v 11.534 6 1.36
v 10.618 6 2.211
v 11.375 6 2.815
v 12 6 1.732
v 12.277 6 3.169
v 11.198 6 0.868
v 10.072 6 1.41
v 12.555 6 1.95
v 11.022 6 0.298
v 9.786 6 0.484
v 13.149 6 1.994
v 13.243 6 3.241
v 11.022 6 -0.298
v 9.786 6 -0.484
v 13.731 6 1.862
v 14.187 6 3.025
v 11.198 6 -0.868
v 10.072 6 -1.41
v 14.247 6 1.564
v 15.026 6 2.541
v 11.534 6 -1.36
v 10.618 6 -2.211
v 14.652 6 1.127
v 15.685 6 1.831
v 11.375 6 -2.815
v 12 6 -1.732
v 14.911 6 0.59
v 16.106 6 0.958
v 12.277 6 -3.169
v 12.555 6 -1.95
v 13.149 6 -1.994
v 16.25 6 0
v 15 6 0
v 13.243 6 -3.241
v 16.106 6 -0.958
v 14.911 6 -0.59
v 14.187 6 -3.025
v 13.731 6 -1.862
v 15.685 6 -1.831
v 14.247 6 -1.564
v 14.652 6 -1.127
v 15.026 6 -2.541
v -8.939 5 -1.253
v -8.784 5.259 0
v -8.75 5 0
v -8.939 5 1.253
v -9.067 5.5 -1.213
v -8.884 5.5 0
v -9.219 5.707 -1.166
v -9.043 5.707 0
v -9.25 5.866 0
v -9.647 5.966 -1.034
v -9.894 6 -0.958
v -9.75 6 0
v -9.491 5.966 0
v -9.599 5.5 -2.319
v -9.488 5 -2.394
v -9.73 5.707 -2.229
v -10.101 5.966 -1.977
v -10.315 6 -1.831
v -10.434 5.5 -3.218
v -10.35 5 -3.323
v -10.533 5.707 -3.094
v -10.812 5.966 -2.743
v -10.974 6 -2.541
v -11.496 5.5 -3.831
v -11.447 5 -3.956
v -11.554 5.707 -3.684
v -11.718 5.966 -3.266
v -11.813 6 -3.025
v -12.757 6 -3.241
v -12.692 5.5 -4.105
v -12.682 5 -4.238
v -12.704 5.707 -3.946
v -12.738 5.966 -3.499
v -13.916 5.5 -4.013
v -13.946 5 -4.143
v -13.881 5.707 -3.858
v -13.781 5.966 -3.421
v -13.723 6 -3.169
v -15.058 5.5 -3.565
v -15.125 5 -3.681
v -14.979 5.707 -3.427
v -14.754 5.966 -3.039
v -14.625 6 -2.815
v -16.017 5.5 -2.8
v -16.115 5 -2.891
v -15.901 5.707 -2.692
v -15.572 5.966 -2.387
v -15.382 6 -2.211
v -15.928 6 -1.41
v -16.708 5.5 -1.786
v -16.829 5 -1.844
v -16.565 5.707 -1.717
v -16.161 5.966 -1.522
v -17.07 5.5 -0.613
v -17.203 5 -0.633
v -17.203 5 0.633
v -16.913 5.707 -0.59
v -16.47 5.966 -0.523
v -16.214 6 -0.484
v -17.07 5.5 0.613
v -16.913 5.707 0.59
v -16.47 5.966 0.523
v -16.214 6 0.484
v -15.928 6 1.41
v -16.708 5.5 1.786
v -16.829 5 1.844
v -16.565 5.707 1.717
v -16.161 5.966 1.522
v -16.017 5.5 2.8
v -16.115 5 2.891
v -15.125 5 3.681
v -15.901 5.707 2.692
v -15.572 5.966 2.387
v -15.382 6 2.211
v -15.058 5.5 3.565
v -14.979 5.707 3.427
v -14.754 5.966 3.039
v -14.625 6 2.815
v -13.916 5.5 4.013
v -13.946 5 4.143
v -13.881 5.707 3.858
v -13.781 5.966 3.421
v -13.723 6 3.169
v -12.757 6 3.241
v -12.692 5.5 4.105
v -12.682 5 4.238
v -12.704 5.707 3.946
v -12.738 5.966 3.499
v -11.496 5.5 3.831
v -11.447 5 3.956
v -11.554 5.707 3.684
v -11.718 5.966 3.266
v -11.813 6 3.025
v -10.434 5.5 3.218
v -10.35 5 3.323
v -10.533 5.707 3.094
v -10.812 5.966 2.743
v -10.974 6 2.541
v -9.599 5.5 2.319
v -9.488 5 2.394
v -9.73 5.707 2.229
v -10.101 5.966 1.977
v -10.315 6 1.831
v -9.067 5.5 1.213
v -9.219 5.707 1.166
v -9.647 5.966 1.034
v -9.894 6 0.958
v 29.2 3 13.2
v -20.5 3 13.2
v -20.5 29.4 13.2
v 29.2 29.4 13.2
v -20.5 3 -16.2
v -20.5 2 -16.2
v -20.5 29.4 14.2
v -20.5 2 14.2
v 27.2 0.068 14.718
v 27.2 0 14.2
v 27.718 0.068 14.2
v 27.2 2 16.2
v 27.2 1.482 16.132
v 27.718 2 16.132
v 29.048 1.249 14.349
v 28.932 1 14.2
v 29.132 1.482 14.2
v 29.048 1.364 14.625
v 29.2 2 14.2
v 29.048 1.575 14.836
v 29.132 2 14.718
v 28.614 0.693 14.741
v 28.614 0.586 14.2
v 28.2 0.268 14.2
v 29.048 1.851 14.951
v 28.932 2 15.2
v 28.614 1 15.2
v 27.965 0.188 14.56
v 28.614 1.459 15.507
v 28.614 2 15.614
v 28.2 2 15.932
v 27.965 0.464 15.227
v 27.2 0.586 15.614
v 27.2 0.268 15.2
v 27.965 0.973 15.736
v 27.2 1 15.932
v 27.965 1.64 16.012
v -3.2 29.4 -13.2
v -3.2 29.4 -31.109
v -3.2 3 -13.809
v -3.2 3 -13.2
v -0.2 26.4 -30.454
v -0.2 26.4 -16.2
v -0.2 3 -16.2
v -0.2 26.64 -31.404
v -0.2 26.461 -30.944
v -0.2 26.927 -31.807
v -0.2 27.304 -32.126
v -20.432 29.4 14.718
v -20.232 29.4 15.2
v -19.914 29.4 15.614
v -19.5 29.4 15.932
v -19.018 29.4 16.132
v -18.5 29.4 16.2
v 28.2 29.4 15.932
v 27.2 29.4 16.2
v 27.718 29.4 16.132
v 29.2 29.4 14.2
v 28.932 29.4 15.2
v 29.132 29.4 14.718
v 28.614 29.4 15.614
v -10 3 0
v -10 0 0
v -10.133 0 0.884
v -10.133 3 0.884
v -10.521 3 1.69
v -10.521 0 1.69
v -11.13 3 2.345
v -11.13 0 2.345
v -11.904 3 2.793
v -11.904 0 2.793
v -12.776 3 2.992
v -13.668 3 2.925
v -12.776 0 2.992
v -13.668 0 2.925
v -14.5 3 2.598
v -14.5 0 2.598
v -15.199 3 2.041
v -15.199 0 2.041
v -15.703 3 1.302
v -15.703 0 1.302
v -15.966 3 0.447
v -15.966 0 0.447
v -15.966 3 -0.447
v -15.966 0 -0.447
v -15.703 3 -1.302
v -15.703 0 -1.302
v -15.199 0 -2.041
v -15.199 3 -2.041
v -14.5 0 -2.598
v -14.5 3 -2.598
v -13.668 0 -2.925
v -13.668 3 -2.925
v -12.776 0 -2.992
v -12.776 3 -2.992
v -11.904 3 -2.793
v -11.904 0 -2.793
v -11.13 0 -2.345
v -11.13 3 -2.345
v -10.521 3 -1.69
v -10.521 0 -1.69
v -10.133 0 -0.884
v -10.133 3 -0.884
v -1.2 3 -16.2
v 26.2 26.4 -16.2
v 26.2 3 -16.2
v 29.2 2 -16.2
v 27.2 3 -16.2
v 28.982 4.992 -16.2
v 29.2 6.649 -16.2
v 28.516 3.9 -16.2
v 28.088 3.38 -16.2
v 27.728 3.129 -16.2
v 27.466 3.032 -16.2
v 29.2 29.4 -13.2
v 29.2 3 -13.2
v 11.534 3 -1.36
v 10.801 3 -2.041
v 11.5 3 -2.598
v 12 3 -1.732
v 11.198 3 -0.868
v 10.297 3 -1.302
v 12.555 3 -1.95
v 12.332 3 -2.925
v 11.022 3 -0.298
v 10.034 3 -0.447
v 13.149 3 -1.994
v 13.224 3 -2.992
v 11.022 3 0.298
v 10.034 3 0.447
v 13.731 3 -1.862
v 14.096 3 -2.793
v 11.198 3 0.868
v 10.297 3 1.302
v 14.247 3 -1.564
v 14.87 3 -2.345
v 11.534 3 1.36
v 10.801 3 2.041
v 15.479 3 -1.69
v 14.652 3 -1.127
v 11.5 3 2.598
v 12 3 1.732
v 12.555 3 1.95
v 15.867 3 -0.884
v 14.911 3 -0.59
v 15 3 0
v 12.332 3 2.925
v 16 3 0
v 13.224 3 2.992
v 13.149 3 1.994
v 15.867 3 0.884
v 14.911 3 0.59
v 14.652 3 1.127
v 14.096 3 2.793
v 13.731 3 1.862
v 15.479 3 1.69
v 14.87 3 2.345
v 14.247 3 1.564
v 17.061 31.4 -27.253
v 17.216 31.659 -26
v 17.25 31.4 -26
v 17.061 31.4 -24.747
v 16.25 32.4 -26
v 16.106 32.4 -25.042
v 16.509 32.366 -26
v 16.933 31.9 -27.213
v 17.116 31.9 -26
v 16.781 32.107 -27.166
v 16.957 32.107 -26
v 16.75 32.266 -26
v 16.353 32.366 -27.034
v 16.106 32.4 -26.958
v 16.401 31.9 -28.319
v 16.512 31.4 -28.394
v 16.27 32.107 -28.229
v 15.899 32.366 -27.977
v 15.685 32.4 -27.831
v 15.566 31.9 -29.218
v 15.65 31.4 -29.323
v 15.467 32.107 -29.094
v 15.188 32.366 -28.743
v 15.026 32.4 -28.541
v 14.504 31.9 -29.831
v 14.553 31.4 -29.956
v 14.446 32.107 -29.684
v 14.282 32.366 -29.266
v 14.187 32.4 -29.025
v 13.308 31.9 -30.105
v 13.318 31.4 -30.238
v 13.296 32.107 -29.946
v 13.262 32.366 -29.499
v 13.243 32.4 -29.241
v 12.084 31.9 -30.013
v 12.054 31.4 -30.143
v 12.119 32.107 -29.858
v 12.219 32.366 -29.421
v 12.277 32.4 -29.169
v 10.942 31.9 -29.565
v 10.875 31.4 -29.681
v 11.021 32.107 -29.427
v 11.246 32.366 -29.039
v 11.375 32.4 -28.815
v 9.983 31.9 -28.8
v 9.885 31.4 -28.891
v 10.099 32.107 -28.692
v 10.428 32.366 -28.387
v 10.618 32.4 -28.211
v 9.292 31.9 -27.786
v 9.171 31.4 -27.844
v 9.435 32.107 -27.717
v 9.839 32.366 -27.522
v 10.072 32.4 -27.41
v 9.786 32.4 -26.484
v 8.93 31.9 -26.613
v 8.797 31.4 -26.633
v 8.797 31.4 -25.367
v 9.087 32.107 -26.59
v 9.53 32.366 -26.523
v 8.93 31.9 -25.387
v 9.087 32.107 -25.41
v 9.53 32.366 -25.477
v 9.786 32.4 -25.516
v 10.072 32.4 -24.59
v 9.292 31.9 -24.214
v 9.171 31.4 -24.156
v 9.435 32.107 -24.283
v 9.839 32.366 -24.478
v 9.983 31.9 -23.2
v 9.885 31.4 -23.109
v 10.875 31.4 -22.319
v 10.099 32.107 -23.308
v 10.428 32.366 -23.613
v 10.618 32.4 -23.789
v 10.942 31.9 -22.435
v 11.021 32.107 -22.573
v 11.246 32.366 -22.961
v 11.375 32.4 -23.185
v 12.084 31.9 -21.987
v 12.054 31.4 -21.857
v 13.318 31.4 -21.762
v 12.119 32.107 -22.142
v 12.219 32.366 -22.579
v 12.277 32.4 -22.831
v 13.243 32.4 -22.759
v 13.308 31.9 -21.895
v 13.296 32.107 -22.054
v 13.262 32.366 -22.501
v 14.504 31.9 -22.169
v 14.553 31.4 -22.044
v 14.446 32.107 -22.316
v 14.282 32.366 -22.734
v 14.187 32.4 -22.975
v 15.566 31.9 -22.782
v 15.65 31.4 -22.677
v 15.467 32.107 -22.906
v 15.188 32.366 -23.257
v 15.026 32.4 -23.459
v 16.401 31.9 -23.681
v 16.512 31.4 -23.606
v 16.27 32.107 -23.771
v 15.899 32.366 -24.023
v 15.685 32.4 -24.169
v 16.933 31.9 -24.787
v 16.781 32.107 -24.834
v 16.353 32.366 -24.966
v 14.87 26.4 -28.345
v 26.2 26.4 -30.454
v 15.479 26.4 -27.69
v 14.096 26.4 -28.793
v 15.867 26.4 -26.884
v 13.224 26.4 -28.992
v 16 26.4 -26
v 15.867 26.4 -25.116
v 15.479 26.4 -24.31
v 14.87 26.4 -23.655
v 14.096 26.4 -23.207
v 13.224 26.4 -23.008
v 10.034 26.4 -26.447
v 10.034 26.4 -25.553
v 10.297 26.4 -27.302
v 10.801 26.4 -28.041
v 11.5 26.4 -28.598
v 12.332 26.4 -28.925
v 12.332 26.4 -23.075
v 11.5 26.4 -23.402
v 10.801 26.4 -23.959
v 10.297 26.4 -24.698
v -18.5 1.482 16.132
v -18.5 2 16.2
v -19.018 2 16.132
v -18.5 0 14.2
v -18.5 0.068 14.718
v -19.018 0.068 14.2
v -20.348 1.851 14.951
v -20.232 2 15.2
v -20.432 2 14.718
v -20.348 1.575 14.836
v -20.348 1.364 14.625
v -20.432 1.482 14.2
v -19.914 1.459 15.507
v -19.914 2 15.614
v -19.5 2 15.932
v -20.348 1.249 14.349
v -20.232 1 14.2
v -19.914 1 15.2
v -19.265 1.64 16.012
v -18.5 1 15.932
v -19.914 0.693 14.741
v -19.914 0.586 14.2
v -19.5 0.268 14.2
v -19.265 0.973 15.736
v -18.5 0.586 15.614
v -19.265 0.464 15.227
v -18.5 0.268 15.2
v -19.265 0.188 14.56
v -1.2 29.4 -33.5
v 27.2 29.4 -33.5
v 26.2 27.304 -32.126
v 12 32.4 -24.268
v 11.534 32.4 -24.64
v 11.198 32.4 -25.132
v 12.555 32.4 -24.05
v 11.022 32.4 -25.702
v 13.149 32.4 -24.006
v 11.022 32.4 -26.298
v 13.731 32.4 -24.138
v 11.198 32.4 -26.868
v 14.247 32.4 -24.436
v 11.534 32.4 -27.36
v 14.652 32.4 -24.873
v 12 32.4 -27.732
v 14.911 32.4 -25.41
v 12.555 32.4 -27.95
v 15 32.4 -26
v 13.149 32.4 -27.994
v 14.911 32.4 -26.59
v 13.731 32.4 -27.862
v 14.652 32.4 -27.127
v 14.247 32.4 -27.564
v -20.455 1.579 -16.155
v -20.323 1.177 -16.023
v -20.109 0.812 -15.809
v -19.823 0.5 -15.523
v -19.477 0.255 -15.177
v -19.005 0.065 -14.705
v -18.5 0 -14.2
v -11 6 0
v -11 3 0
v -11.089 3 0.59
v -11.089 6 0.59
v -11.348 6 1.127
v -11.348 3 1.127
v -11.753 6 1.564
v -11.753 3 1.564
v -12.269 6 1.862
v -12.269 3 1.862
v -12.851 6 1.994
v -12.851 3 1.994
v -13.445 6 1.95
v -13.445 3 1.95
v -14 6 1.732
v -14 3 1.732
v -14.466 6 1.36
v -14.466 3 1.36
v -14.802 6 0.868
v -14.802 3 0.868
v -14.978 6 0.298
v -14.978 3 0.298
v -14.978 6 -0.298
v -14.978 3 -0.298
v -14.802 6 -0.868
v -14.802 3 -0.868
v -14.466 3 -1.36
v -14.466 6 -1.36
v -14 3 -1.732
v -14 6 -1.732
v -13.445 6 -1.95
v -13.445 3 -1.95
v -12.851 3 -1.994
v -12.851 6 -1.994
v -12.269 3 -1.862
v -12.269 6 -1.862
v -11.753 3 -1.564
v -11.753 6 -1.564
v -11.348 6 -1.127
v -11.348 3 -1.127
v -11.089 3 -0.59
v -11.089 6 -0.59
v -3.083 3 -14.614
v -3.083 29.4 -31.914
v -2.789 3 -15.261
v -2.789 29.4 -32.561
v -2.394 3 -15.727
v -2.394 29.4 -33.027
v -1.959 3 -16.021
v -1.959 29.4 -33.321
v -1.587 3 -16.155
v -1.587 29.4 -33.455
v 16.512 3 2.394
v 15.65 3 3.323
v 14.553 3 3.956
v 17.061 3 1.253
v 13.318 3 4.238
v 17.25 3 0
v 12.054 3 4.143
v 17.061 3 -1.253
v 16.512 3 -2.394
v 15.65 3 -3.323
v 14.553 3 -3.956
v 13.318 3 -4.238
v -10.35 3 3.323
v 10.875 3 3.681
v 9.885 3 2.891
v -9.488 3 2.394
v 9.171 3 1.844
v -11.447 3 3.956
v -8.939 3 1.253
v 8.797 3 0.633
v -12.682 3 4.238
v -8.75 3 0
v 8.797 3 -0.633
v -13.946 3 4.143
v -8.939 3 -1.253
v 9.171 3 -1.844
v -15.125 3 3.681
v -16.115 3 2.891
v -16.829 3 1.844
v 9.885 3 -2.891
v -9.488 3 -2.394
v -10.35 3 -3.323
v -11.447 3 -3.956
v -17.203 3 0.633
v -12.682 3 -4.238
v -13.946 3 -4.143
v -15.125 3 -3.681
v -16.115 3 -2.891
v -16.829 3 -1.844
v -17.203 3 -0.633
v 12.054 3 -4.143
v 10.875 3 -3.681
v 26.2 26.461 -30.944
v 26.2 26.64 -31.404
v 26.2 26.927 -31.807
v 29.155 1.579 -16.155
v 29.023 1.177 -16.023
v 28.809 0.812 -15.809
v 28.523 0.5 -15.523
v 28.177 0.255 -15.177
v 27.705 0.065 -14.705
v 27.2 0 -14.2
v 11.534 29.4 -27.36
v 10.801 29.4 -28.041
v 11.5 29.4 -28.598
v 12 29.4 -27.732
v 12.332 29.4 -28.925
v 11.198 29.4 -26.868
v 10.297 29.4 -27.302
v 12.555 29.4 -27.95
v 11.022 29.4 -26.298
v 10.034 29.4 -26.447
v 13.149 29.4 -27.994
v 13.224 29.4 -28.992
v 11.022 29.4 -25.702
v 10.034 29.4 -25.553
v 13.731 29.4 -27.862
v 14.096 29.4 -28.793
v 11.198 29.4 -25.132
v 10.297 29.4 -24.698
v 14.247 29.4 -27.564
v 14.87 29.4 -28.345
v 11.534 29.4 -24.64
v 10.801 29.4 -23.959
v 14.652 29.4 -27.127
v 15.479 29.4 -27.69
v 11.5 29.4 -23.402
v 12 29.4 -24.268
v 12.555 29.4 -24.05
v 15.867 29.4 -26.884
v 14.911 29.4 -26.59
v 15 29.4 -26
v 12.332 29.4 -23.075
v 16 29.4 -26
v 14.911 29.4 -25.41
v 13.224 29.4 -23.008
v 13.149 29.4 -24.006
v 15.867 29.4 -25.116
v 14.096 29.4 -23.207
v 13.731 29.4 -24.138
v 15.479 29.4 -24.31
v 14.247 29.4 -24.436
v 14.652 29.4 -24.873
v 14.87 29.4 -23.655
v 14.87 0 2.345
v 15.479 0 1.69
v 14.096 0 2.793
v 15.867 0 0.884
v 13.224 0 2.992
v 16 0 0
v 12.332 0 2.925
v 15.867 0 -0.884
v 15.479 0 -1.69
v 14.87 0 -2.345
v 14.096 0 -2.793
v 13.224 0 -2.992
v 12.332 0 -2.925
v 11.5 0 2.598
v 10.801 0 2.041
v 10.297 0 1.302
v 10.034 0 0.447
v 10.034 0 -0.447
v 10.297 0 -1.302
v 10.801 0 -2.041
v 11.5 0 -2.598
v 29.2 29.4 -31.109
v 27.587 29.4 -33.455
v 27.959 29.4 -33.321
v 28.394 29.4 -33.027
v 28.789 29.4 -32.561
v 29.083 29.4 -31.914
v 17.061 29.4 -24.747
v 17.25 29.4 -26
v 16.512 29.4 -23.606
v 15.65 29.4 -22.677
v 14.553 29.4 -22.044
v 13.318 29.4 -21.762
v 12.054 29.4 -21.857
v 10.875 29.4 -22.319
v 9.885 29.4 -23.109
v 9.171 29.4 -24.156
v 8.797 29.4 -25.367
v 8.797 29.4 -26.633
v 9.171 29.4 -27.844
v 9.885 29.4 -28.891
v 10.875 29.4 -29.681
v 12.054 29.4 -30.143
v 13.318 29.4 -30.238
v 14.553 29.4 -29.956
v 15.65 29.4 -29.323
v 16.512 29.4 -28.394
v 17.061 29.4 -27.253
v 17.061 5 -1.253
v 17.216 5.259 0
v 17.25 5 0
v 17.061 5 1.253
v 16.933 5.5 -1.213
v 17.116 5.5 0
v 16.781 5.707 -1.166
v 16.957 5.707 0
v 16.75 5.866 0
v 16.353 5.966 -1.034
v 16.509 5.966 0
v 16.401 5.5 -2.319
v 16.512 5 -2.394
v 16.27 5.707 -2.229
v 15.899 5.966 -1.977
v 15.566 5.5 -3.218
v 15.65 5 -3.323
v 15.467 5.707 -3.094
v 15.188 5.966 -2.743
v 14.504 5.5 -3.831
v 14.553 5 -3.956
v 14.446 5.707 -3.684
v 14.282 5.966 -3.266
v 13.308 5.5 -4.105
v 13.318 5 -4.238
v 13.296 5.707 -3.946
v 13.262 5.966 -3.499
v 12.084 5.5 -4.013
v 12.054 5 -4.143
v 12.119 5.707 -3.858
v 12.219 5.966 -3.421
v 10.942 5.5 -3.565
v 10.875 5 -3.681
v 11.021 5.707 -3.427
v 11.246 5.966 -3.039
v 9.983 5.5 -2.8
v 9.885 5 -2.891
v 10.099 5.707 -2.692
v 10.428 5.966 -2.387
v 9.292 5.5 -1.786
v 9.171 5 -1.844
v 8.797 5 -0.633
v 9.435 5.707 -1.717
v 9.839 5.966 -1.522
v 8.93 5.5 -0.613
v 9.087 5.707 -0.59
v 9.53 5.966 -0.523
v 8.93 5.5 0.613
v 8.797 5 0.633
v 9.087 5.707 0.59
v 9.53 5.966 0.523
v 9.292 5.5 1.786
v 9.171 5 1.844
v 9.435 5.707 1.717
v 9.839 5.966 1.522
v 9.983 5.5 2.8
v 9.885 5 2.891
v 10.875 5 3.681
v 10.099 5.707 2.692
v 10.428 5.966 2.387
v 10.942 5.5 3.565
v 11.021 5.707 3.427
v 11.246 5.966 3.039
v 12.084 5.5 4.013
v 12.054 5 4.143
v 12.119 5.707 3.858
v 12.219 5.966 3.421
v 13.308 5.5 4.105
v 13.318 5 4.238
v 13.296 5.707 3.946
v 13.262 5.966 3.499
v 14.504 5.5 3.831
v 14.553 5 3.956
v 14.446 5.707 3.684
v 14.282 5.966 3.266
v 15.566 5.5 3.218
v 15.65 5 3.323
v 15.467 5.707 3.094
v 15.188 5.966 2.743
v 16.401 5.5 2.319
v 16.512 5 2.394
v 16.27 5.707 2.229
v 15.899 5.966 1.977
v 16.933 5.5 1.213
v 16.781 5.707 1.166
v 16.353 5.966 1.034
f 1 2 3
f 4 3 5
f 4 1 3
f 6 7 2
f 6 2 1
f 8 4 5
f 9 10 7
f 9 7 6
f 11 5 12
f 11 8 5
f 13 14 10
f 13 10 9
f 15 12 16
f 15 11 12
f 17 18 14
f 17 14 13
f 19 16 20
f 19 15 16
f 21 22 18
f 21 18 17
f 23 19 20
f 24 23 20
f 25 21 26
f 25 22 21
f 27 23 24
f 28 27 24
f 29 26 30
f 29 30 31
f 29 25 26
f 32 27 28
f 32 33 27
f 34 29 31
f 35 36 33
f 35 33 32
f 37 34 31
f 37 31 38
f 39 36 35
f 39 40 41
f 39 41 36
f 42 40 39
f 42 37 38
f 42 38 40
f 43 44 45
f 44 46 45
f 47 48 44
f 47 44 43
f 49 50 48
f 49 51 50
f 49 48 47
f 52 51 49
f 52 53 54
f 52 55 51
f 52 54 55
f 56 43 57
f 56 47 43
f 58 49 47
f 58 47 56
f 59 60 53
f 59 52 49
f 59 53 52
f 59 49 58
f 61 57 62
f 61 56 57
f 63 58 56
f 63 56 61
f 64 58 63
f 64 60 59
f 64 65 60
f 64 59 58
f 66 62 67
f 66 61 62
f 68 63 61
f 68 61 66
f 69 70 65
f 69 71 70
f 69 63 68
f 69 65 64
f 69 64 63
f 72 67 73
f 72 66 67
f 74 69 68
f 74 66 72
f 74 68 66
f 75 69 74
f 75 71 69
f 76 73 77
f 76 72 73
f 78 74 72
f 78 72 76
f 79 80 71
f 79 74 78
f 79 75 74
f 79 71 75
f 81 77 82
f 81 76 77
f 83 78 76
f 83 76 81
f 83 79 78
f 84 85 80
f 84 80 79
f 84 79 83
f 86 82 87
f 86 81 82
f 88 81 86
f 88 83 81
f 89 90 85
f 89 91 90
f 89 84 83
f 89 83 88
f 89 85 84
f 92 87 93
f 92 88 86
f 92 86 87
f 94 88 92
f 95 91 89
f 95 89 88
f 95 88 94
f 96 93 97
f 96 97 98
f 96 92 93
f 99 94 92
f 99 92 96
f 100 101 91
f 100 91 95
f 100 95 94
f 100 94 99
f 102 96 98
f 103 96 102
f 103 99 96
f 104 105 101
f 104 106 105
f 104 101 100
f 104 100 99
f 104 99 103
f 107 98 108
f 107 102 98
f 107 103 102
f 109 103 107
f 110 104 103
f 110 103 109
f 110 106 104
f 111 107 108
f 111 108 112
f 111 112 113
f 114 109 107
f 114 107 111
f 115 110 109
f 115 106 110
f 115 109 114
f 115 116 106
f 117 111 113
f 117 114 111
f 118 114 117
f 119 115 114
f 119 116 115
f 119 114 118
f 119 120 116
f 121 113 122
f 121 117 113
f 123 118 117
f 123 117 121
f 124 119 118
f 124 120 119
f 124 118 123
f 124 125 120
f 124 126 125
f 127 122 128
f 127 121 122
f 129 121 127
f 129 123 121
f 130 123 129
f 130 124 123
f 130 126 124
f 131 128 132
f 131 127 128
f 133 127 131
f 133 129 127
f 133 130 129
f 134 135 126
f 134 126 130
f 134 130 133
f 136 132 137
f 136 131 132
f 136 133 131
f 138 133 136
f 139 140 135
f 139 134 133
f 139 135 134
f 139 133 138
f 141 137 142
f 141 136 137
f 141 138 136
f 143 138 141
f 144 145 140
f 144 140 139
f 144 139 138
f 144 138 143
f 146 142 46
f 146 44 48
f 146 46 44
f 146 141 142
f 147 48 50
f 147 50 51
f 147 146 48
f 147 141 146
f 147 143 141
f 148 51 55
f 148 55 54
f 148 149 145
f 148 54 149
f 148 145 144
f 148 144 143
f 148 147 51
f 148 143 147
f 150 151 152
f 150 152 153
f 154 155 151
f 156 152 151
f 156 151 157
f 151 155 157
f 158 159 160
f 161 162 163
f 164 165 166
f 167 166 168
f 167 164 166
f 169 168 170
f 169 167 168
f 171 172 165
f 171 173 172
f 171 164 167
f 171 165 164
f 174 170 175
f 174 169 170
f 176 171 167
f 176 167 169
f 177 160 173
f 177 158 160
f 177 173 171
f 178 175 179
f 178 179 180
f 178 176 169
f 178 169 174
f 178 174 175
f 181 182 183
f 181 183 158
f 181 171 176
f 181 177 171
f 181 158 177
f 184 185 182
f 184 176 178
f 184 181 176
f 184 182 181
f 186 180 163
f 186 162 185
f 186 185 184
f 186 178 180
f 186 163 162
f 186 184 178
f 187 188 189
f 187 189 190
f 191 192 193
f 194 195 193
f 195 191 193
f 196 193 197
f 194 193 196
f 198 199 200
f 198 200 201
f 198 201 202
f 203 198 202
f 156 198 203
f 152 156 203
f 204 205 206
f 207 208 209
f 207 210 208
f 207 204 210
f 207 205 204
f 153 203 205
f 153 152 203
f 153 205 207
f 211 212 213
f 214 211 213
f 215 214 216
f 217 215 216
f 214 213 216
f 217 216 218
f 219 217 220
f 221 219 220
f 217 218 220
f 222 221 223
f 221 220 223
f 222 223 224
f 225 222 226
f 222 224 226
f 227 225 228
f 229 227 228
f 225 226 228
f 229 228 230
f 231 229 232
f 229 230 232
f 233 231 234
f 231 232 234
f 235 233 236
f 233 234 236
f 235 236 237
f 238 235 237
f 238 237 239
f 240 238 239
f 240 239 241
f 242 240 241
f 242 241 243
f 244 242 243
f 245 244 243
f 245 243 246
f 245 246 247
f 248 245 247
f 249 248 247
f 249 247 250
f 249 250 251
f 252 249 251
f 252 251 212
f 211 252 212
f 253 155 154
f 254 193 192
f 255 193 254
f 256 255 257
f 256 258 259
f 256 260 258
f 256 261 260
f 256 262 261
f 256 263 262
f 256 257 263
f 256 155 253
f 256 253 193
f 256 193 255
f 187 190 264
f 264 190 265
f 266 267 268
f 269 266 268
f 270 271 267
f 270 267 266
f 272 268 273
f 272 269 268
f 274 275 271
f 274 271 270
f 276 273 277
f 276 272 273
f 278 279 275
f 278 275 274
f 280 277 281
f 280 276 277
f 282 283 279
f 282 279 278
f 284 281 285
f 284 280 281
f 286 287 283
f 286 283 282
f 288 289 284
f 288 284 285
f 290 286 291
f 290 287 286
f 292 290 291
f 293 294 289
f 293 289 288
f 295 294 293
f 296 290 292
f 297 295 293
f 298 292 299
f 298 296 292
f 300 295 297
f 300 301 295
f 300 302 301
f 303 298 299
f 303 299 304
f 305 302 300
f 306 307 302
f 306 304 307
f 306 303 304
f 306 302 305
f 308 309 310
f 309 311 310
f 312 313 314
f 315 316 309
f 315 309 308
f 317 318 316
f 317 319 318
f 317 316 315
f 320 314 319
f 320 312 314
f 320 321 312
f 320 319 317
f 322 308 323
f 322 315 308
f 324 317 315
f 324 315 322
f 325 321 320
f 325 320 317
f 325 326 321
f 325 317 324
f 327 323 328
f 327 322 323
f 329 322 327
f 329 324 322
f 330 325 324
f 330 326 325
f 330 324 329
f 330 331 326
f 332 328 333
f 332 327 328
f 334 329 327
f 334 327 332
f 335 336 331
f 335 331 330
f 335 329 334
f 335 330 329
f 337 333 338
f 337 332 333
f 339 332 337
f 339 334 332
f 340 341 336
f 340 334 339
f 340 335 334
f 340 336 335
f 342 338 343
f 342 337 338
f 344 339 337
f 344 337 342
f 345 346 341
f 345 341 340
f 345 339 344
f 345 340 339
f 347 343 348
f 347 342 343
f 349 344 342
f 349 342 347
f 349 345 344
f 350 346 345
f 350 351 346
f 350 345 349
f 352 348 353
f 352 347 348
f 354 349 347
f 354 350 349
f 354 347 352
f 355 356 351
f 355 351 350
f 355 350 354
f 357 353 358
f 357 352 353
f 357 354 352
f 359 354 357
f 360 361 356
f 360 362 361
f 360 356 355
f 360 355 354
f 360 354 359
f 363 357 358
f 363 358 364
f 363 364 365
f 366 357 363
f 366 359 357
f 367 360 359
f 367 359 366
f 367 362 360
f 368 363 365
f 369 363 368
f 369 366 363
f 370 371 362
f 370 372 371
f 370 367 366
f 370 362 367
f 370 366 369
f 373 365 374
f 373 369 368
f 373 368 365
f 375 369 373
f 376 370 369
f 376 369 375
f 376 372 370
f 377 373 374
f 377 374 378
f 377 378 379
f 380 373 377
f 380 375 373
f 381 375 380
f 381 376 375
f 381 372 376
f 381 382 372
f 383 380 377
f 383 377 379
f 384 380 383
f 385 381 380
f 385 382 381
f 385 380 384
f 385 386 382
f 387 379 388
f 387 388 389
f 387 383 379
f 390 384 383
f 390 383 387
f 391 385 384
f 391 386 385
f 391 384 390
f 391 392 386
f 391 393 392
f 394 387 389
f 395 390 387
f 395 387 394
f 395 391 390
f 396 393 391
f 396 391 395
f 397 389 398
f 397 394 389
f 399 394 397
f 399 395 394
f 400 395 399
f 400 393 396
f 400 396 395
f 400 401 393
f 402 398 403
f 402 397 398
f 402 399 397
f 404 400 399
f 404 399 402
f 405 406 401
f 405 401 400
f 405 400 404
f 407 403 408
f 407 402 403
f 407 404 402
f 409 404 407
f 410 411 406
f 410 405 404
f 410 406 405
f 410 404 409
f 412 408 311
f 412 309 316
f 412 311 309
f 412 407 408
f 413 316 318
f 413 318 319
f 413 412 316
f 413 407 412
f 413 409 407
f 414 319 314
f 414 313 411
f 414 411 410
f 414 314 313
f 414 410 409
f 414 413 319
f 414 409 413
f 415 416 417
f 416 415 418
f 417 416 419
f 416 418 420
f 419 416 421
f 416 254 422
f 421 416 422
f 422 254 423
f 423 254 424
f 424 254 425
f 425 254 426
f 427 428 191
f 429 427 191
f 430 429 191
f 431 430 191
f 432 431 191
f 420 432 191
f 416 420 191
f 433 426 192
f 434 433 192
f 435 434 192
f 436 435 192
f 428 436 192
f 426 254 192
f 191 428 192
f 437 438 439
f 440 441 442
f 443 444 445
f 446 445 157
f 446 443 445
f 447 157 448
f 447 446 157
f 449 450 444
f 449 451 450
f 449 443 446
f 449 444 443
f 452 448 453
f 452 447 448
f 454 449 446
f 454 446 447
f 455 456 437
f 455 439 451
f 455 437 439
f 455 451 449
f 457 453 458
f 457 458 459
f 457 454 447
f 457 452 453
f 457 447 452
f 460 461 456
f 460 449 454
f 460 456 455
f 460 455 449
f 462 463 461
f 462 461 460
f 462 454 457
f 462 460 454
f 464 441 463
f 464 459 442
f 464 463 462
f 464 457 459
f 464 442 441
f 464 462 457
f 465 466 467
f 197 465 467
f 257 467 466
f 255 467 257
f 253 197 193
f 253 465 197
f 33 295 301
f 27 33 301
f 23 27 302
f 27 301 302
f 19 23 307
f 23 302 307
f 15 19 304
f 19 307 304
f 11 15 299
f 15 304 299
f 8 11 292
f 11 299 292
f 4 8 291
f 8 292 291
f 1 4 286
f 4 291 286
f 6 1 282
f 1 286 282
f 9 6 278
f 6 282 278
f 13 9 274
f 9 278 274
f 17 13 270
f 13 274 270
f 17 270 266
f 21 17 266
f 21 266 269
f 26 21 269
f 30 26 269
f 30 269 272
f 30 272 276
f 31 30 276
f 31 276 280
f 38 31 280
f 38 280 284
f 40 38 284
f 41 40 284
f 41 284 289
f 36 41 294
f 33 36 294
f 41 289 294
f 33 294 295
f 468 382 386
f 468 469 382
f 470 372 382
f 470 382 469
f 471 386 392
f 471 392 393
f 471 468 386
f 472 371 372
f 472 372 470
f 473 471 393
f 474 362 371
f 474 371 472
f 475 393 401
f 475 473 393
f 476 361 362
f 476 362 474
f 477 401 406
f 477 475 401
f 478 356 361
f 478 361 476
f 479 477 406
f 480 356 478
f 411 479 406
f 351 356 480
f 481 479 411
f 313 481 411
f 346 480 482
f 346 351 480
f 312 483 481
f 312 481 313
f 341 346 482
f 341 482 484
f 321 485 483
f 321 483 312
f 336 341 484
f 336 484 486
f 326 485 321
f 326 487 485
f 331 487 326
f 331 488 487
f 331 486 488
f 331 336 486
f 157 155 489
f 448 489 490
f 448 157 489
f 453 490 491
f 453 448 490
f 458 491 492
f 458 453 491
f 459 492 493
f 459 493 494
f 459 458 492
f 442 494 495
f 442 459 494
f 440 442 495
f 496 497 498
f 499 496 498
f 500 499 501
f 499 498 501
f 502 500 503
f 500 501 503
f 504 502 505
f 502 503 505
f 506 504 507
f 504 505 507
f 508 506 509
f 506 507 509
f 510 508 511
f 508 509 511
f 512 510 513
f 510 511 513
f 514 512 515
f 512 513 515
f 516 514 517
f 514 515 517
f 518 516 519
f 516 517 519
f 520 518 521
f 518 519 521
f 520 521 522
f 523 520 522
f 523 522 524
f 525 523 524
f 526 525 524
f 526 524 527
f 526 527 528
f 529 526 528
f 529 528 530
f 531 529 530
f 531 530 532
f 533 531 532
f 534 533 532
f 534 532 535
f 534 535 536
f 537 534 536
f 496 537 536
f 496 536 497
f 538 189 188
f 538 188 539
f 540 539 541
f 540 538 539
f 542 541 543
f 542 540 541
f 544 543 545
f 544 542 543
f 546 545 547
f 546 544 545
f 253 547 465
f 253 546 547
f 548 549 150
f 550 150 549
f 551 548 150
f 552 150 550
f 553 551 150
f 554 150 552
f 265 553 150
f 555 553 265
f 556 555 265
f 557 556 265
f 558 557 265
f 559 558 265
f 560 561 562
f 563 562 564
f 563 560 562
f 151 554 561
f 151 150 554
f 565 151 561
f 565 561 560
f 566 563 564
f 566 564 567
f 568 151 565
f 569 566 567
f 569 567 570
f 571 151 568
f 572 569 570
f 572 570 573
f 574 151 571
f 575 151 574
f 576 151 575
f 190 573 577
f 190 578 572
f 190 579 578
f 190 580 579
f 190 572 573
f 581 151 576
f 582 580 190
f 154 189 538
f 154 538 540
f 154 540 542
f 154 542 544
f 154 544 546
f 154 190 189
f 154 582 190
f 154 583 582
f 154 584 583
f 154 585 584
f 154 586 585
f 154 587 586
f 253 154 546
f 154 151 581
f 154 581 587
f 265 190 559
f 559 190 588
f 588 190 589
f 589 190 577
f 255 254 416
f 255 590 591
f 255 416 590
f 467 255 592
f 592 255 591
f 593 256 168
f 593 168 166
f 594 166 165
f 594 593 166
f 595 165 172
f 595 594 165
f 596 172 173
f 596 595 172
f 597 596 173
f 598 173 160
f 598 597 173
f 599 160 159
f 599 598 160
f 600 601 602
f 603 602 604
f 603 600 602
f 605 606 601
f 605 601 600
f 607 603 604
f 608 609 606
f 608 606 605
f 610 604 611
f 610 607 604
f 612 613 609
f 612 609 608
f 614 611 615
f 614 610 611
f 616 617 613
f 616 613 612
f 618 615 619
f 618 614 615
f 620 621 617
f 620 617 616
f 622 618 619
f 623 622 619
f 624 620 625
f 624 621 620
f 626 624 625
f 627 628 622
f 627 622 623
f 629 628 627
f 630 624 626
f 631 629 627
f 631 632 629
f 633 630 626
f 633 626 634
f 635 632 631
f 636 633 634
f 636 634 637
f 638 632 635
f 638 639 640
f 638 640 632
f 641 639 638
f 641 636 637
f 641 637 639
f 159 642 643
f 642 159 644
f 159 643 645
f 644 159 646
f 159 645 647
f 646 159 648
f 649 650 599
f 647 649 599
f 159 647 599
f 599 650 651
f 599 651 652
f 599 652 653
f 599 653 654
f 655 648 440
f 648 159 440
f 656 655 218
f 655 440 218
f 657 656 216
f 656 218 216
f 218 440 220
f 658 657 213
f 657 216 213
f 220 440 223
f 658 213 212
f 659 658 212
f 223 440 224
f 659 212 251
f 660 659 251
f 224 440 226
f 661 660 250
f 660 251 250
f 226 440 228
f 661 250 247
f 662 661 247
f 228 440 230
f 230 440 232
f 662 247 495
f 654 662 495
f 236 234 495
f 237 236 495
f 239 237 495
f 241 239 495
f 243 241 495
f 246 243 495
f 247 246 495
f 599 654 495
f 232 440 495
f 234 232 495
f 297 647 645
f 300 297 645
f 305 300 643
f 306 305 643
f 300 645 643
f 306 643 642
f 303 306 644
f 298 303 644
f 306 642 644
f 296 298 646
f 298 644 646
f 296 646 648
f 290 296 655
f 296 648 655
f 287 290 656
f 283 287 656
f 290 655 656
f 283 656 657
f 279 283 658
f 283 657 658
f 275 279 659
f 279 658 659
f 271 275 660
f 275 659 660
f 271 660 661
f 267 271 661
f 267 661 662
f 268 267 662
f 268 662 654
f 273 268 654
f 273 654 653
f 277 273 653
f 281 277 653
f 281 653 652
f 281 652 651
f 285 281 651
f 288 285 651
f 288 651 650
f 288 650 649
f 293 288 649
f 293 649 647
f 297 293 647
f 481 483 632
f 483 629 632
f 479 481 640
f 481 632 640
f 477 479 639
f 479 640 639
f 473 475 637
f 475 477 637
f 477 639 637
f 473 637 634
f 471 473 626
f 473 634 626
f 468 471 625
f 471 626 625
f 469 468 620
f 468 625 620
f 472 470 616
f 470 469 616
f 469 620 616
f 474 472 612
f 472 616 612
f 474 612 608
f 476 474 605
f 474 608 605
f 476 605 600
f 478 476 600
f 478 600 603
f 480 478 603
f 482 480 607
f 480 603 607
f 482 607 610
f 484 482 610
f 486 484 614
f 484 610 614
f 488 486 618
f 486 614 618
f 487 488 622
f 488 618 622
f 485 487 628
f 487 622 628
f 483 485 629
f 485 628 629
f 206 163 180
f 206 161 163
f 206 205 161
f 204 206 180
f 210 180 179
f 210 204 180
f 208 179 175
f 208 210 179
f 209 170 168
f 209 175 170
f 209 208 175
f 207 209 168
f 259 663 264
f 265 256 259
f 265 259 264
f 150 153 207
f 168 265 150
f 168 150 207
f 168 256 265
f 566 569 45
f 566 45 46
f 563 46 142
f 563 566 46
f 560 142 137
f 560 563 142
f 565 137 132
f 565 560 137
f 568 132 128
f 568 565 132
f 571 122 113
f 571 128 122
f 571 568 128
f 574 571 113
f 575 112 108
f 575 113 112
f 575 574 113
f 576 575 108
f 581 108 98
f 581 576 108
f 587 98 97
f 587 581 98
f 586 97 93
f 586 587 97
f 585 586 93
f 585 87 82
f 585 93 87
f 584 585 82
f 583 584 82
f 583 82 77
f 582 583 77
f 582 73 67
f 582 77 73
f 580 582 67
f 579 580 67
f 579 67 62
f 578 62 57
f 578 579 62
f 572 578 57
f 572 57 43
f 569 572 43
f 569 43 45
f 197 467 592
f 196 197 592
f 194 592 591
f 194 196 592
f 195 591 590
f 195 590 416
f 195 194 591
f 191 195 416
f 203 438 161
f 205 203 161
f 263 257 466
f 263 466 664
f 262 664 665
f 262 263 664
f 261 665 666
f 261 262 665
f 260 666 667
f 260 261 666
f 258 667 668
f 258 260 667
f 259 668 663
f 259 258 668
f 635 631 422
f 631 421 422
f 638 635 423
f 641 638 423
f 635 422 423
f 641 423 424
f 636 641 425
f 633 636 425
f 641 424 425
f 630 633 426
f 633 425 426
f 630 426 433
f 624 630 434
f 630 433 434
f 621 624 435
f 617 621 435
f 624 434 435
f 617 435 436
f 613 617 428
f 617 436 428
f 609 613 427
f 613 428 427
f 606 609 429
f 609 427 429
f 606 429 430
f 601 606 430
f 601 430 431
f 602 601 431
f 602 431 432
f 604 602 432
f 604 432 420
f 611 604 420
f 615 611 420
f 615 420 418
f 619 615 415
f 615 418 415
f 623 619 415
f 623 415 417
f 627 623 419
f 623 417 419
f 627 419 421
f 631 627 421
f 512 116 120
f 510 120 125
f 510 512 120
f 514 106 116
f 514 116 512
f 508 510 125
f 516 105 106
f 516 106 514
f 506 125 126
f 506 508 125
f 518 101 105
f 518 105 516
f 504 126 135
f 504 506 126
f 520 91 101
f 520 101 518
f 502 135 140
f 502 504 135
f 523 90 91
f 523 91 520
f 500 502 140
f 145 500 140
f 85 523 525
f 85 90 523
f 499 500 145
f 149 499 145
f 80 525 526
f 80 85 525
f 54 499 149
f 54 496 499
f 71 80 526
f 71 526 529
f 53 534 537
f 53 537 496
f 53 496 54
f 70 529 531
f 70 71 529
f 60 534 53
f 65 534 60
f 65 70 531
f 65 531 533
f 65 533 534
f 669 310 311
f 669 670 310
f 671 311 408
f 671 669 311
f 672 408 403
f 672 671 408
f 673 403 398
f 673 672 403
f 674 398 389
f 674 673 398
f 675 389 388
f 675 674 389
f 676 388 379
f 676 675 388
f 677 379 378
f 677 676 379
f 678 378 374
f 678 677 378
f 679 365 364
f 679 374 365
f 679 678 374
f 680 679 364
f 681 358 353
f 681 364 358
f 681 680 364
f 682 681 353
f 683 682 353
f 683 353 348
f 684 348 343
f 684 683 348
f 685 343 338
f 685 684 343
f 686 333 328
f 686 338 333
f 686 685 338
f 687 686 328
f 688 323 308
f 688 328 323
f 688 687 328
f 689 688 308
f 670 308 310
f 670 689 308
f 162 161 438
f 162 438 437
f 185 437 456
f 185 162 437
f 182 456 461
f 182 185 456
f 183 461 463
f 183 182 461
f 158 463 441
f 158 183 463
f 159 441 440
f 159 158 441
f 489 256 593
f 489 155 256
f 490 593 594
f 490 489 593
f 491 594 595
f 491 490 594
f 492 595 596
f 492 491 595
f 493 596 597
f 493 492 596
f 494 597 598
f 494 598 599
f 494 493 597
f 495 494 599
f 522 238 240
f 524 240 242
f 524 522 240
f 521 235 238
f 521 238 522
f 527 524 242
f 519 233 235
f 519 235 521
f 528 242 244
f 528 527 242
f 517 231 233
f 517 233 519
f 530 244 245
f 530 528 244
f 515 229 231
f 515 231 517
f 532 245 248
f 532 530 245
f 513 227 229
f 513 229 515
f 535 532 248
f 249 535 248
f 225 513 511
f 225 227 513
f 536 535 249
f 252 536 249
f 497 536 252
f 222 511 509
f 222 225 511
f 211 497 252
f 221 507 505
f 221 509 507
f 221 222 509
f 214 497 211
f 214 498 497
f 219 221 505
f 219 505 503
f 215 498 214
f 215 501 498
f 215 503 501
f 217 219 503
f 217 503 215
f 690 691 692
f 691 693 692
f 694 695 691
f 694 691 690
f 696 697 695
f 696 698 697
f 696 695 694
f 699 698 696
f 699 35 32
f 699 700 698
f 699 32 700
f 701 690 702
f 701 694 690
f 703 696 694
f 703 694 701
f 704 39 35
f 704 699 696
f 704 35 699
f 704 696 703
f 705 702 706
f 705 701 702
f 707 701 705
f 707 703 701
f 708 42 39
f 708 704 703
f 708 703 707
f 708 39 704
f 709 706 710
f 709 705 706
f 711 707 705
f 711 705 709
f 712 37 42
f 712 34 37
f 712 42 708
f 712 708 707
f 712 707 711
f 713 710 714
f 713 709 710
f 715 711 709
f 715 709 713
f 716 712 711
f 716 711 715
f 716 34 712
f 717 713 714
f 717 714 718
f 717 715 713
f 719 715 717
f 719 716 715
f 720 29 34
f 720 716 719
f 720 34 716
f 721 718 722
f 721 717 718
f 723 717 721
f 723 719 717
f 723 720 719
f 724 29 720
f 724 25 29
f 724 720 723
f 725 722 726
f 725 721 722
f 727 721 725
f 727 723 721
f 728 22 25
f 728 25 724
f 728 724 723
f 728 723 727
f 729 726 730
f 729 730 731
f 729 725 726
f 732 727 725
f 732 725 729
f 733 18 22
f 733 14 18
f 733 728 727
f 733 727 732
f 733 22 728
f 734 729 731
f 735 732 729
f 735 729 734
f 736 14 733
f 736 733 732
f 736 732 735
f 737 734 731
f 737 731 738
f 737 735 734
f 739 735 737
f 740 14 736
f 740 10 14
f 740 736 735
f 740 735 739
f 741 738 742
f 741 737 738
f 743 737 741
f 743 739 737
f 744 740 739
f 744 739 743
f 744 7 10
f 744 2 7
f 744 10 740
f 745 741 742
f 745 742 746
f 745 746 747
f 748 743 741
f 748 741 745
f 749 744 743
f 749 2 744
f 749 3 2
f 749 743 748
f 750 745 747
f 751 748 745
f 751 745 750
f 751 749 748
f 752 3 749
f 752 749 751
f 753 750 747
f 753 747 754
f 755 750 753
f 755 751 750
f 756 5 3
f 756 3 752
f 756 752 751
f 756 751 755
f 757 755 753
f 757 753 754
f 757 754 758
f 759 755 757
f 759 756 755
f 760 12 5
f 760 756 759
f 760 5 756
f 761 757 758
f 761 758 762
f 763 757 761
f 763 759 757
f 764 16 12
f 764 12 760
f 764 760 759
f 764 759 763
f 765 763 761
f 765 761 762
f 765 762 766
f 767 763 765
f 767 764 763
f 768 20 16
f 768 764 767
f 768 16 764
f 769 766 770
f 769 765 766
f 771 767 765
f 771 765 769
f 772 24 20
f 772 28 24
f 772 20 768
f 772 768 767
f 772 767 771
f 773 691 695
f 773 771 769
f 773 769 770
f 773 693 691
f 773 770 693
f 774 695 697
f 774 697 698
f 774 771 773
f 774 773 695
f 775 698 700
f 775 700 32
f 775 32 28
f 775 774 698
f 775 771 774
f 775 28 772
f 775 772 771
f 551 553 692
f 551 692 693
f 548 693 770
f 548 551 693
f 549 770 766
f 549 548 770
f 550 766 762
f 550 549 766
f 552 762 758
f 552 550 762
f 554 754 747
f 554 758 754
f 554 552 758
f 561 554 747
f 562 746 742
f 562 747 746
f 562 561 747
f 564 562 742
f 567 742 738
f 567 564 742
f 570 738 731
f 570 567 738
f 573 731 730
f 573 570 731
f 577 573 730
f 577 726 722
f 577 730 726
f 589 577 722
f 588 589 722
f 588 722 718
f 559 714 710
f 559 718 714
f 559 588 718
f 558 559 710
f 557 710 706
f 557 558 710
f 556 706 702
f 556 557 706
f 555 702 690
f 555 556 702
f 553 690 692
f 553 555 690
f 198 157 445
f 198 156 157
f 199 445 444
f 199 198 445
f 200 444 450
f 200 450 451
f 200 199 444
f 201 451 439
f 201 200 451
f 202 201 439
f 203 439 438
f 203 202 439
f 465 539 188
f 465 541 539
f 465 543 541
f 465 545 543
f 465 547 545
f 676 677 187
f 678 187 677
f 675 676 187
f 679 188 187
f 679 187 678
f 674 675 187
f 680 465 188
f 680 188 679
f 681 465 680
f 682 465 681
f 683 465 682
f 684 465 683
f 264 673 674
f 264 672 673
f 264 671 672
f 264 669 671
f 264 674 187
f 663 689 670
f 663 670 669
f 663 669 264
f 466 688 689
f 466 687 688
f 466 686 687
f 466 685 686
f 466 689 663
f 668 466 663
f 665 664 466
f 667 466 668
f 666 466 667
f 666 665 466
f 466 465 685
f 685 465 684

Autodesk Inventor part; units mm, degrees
ref_plane "YZ Plane" through (0, 0, 0) normal (1, 0, 0) x (0, 1, 0)
ref_plane "XZ Plane" through (0, 0, 0) normal (0, 1, 0) x (-1, 0, 0)
ref_plane "XY Plane" through (0, 0, 0) normal (0, 0, 1) x (1, 0, 0)
sketch "Sketch1" plane through (0, 0, 0) normal (0, 1, 0) x (-1, 0, 0)
  line L0 (20.5, 16.2) -> (-20.5, 16.2)
  line L1 (-20.5, 16.2) -> (-20.5, -16.2)
  line L2 (-20.5, -16.2) -> (20.5, -16.2)
  line L3 (20.5, -16.2) -> (20.5, 16.2)
  point P0 (0, 0)
  dimension "d0" = 41
  dimension "d1" = 32.4
extrude "Extrusion1" add sketch "Sketch1" along normal blind 3
sketch "Sketch4" plane through (20.5, 0, -16.2) normal (0, 0, -1) x (-1, 0, 0)
  line L0 (41, 3) -> (0, 3) projected
  line L1 (0, 28.4) -> (41, 28.4) projected
  line L2 (0, 3) -> (21.5, 3)
  line L3 (21.5, 3) -> (21.5, 28.4)
  line L4 (21.5, 28.4) -> (0, 28.4)
  line L5 (0, 28.4) -> (0, 3)
  point P0 (20.5, 0)
  dimension "d12" = 21.5
extrude "Extrusion4" cut sketch "Sketch4" against normal blind 3
sketch "Sketch5" plane through (-20.5, 0, 16.2) normal (0, 0, 1) x (1, 0, 0)
  line L0 (41, 28.4) -> (0, 28.4) projected
  line L1 (41, 3) -> (0, 3) projected
  line L2 (0, 28.4) -> (21.5, 28.4)
  line L3 (21.5, 28.4) -> (21.5, 3)
  line L4 (21.5, 3) -> (0, 3)
  line L5 (0, 3) -> (0, 28.4)
  point P0 (20.5, 0)
  point P1 (19.5, 3)
  point P2 (19.5, 3)
  dimension "d15" = 21.5
extrude "Extrusion5" cut sketch "Sketch5" against normal blind 3
sketch "Sketch6" plane through (0, 3, 0) normal (0, 1, 0) x (1, 0, 0)
  circle A0 centre (13, 0) radius 4.25
  circle A1 centre (-13, 0) radius 4.25
  point P0 (0, 0)
  dimension "d20" = 8.5
  dimension "d21" = 8.5
extrude "Extrusion6" add sketch "Sketch6" along normal blind 3
sketch "Sketch7" plane through (0, 0, 0) normal (0, -1, 0) x (1, 0, 0)
  circle A0 centre (-13, 0) radius 4.25 projected
  circle A1 centre (-13, 0) radius 2
  circle A2 centre (13, 0) radius 4.25 projected
  circle A3 centre (13, 0) radius 2
  point P0 (0, 0)
  dimension "d24" = 4
  dimension "d25" = 4
extrude "Extrusion7" cut sketch "Sketch7" against normal blind 6 contours A1 | A3
sketch "Sketch8" plane through (0, 0, 0) normal (0, -1, 0) x (1, 0, 0)
  circle A0 centre (-13, 0) radius 2 projected
  circle A1 centre (-13, 0) radius 3
  circle A2 centre (13, 0) radius 2 projected
  circle A3 centre (13, 0) radius 3
  point P0 (0, 0)
  dimension "d28" = 6
  dimension "d29" = 6
extrude "Extrusion8" cut sketch "Sketch8" against normal blind 3 contours A0 | A1 | A2 | A3
sketch "Sketch15" plane through (20.5, 0, 16.2) normal (1, 0, 0) x (0, 0, -1)
  line L0 (0, 3) -> (32.4, 3) projected
  line L1 (0, 0) -> (32.4, 0)
  line L2 (32.4, 0) -> (32.4, 3)
  line L3 (32.4, 3) -> (0, 3)
  line L4 (0, 3) -> (0, 0)
  point P0 (16.2, 0)
extrude "Extrusion15" add sketch "Sketch15" along normal blind 8.7
sketch "Sketch23" plane through (0, 3, 0) normal (0, 1, 0) x (1, 0, 0)
  line L0 (-20.5, 16.2) -> (29.2, 16.2) projected
  line L1 (29.2, 16.2) -> (-3.2, 16.2)
  line L2 (-3.2, 16.2) -> (-3.2, 13.2)
  line L3 (-3.2, 13.2) -> (29.2, 13.2)
  line L4 (29.2, 13.2) -> (29.2, 16.2)
  point P0 (0, 0)
  dimension "d81" = 32.4
  dimension "d82" = 3
extrude "Extrusion23" add sketch "Sketch23" along normal blind 26.4
sketch "Sketch24" plane through (-20.5, 0, -16.2) normal (0, 0, -1) x (-1, 0, 0)
  line L0 (-17.3, 3) -> (-17.3, 29.4) projected
  line L1 (-49.7, 3) -> (-17.3, 3) projected
  line L2 (-17.3, 29.4) -> (-20.3, 29.4)
  line L3 (-20.3, 29.4) -> (-20.3, 3)
  line L4 (-20.3, 3) -> (-17.3, 3)
  line L5 (-17.3, 3) -> (-17.3, 29.4)
  line L6 (-49.7, 0) -> (-49.7, 29.4) projected
  line L7 (-49.7, 29.4) -> (-46.7, 29.4)
  line L8 (-46.7, 29.4) -> (-46.7, 3)
  line L9 (-46.7, 3) -> (-49.7, 3)
  line L10 (-49.7, 3) -> (-49.7, 29.4)
  line L11 (-20.3, 29.4) -> (-46.7, 29.4)
  line L12 (-46.7, 29.4) -> (-46.7, 26.4)
  line L13 (-46.7, 26.4) -> (-20.3, 26.4)
  line L14 (-20.3, 26.4) -> (-20.3, 29.4)
  point P0 (-20.5, 0)
  dimension "d85" = 3
  dimension "d86" = 3
  dimension "d87" = 3
extrude "Extrusion24" add sketch "Sketch24" along normal blind 17.3 contours L1 L3 L2 L0 | L3 L13 L8 L11 | L1 L6 L7 L8
sketch "Sketch25" plane through (-3.2, 3, -13.2) normal (-1, 0, 0) x (0, 0, 1)
  line L0 (0, 26.4) -> (-20.3, 26.4) projected
  line L1 (0, 0) -> (-3, 0) projected
  line L2 (-20.3, 26.4) -> (-3, 0)
  line L3 (-20.3, 26.4) -> (-20.3, 0) projected
  line L4 (-3, 0) -> (-20.3, 0)
  line L5 (-20.3, 0) -> (-20.3, 26.4)
  point P0 (13.2, -3)
extrude "Extrusion25" cut sketch "Sketch25" against normal blind 32.4
sketch "Sketch26" plane through (0, 29.4, 0) normal (0, 1, 0) x (1, 0, 0)
  circle A0 centre (13, 26) radius 2
  point P0 (0, 0)
  dimension "d92" = 4
extrude "Extrusion26" cut sketch "Sketch26" against normal blind 32.4
sketch "Sketch27" plane through (0, 29.4, 0) normal (0, 1, 0) x (1, 0, 0)
  circle A0 centre (13, 26) radius 2 projected
  circle A1 centre (13, 26) radius 4.25
  point P0 (0, 0)
  dimension "d95" = 8.5
extrude "Extrusion27" add sketch "Sketch27" along normal blind 3
sketch "Sketch28" plane through (0, 3, 0) normal (0, 1, 0) x (1, 0, 0)
  line L0 (-20.5, -16.2) -> (29.2, -16.2) projected
  line L1 (-20.5, 16.2) -> (-20.5, -16.2) projected
  line L2 (29.2, -16.2) -> (-20.5, -16.2)
  line L3 (-20.5, -16.2) -> (-20.5, -13.2)
  line L4 (-20.5, -13.2) -> (29.2, -13.2)
  line L5 (29.2, -13.2) -> (29.2, -16.2)
  point P0 (0, 0)
  dimension "d98" = 3
extrude "Extrusion28" add sketch "Sketch28" along normal blind 26.4
fillet "Fillet3" radius 1 3 edges at (8.75, 32.4, -26) (-17.25, 6, 0) (8.75, 6, 0)
fillet "Fillet4" radius 2 9 edges at (4.35, 0, 16.2) (-20.5, 0, 0) (29.2, 14.7, 16.2) (29.2, 0, 0) (29.2, 16.2, -24.85) (-3.2, 16.2, -24.85) (4.35, 0, -16.2) (13, 26.4, -31.5341) (-20.5, 14.7, 16.2)
sketch "Sketch29" plane through (-0.2, 26.4, -16.2) normal (0, -1, 0) x (1, 0, 0)
  circle A0 centre (13.2, -9.8) radius 2 projected
  circle A1 centre (13.2, -9.8) radius 3
  point P0 (0.2, 16.2)
  dimension "d103" = 6
extrude "Extrusion29" cut sketch "Sketch29" against normal blind 3
properties part number "cornerMount_PBF"
